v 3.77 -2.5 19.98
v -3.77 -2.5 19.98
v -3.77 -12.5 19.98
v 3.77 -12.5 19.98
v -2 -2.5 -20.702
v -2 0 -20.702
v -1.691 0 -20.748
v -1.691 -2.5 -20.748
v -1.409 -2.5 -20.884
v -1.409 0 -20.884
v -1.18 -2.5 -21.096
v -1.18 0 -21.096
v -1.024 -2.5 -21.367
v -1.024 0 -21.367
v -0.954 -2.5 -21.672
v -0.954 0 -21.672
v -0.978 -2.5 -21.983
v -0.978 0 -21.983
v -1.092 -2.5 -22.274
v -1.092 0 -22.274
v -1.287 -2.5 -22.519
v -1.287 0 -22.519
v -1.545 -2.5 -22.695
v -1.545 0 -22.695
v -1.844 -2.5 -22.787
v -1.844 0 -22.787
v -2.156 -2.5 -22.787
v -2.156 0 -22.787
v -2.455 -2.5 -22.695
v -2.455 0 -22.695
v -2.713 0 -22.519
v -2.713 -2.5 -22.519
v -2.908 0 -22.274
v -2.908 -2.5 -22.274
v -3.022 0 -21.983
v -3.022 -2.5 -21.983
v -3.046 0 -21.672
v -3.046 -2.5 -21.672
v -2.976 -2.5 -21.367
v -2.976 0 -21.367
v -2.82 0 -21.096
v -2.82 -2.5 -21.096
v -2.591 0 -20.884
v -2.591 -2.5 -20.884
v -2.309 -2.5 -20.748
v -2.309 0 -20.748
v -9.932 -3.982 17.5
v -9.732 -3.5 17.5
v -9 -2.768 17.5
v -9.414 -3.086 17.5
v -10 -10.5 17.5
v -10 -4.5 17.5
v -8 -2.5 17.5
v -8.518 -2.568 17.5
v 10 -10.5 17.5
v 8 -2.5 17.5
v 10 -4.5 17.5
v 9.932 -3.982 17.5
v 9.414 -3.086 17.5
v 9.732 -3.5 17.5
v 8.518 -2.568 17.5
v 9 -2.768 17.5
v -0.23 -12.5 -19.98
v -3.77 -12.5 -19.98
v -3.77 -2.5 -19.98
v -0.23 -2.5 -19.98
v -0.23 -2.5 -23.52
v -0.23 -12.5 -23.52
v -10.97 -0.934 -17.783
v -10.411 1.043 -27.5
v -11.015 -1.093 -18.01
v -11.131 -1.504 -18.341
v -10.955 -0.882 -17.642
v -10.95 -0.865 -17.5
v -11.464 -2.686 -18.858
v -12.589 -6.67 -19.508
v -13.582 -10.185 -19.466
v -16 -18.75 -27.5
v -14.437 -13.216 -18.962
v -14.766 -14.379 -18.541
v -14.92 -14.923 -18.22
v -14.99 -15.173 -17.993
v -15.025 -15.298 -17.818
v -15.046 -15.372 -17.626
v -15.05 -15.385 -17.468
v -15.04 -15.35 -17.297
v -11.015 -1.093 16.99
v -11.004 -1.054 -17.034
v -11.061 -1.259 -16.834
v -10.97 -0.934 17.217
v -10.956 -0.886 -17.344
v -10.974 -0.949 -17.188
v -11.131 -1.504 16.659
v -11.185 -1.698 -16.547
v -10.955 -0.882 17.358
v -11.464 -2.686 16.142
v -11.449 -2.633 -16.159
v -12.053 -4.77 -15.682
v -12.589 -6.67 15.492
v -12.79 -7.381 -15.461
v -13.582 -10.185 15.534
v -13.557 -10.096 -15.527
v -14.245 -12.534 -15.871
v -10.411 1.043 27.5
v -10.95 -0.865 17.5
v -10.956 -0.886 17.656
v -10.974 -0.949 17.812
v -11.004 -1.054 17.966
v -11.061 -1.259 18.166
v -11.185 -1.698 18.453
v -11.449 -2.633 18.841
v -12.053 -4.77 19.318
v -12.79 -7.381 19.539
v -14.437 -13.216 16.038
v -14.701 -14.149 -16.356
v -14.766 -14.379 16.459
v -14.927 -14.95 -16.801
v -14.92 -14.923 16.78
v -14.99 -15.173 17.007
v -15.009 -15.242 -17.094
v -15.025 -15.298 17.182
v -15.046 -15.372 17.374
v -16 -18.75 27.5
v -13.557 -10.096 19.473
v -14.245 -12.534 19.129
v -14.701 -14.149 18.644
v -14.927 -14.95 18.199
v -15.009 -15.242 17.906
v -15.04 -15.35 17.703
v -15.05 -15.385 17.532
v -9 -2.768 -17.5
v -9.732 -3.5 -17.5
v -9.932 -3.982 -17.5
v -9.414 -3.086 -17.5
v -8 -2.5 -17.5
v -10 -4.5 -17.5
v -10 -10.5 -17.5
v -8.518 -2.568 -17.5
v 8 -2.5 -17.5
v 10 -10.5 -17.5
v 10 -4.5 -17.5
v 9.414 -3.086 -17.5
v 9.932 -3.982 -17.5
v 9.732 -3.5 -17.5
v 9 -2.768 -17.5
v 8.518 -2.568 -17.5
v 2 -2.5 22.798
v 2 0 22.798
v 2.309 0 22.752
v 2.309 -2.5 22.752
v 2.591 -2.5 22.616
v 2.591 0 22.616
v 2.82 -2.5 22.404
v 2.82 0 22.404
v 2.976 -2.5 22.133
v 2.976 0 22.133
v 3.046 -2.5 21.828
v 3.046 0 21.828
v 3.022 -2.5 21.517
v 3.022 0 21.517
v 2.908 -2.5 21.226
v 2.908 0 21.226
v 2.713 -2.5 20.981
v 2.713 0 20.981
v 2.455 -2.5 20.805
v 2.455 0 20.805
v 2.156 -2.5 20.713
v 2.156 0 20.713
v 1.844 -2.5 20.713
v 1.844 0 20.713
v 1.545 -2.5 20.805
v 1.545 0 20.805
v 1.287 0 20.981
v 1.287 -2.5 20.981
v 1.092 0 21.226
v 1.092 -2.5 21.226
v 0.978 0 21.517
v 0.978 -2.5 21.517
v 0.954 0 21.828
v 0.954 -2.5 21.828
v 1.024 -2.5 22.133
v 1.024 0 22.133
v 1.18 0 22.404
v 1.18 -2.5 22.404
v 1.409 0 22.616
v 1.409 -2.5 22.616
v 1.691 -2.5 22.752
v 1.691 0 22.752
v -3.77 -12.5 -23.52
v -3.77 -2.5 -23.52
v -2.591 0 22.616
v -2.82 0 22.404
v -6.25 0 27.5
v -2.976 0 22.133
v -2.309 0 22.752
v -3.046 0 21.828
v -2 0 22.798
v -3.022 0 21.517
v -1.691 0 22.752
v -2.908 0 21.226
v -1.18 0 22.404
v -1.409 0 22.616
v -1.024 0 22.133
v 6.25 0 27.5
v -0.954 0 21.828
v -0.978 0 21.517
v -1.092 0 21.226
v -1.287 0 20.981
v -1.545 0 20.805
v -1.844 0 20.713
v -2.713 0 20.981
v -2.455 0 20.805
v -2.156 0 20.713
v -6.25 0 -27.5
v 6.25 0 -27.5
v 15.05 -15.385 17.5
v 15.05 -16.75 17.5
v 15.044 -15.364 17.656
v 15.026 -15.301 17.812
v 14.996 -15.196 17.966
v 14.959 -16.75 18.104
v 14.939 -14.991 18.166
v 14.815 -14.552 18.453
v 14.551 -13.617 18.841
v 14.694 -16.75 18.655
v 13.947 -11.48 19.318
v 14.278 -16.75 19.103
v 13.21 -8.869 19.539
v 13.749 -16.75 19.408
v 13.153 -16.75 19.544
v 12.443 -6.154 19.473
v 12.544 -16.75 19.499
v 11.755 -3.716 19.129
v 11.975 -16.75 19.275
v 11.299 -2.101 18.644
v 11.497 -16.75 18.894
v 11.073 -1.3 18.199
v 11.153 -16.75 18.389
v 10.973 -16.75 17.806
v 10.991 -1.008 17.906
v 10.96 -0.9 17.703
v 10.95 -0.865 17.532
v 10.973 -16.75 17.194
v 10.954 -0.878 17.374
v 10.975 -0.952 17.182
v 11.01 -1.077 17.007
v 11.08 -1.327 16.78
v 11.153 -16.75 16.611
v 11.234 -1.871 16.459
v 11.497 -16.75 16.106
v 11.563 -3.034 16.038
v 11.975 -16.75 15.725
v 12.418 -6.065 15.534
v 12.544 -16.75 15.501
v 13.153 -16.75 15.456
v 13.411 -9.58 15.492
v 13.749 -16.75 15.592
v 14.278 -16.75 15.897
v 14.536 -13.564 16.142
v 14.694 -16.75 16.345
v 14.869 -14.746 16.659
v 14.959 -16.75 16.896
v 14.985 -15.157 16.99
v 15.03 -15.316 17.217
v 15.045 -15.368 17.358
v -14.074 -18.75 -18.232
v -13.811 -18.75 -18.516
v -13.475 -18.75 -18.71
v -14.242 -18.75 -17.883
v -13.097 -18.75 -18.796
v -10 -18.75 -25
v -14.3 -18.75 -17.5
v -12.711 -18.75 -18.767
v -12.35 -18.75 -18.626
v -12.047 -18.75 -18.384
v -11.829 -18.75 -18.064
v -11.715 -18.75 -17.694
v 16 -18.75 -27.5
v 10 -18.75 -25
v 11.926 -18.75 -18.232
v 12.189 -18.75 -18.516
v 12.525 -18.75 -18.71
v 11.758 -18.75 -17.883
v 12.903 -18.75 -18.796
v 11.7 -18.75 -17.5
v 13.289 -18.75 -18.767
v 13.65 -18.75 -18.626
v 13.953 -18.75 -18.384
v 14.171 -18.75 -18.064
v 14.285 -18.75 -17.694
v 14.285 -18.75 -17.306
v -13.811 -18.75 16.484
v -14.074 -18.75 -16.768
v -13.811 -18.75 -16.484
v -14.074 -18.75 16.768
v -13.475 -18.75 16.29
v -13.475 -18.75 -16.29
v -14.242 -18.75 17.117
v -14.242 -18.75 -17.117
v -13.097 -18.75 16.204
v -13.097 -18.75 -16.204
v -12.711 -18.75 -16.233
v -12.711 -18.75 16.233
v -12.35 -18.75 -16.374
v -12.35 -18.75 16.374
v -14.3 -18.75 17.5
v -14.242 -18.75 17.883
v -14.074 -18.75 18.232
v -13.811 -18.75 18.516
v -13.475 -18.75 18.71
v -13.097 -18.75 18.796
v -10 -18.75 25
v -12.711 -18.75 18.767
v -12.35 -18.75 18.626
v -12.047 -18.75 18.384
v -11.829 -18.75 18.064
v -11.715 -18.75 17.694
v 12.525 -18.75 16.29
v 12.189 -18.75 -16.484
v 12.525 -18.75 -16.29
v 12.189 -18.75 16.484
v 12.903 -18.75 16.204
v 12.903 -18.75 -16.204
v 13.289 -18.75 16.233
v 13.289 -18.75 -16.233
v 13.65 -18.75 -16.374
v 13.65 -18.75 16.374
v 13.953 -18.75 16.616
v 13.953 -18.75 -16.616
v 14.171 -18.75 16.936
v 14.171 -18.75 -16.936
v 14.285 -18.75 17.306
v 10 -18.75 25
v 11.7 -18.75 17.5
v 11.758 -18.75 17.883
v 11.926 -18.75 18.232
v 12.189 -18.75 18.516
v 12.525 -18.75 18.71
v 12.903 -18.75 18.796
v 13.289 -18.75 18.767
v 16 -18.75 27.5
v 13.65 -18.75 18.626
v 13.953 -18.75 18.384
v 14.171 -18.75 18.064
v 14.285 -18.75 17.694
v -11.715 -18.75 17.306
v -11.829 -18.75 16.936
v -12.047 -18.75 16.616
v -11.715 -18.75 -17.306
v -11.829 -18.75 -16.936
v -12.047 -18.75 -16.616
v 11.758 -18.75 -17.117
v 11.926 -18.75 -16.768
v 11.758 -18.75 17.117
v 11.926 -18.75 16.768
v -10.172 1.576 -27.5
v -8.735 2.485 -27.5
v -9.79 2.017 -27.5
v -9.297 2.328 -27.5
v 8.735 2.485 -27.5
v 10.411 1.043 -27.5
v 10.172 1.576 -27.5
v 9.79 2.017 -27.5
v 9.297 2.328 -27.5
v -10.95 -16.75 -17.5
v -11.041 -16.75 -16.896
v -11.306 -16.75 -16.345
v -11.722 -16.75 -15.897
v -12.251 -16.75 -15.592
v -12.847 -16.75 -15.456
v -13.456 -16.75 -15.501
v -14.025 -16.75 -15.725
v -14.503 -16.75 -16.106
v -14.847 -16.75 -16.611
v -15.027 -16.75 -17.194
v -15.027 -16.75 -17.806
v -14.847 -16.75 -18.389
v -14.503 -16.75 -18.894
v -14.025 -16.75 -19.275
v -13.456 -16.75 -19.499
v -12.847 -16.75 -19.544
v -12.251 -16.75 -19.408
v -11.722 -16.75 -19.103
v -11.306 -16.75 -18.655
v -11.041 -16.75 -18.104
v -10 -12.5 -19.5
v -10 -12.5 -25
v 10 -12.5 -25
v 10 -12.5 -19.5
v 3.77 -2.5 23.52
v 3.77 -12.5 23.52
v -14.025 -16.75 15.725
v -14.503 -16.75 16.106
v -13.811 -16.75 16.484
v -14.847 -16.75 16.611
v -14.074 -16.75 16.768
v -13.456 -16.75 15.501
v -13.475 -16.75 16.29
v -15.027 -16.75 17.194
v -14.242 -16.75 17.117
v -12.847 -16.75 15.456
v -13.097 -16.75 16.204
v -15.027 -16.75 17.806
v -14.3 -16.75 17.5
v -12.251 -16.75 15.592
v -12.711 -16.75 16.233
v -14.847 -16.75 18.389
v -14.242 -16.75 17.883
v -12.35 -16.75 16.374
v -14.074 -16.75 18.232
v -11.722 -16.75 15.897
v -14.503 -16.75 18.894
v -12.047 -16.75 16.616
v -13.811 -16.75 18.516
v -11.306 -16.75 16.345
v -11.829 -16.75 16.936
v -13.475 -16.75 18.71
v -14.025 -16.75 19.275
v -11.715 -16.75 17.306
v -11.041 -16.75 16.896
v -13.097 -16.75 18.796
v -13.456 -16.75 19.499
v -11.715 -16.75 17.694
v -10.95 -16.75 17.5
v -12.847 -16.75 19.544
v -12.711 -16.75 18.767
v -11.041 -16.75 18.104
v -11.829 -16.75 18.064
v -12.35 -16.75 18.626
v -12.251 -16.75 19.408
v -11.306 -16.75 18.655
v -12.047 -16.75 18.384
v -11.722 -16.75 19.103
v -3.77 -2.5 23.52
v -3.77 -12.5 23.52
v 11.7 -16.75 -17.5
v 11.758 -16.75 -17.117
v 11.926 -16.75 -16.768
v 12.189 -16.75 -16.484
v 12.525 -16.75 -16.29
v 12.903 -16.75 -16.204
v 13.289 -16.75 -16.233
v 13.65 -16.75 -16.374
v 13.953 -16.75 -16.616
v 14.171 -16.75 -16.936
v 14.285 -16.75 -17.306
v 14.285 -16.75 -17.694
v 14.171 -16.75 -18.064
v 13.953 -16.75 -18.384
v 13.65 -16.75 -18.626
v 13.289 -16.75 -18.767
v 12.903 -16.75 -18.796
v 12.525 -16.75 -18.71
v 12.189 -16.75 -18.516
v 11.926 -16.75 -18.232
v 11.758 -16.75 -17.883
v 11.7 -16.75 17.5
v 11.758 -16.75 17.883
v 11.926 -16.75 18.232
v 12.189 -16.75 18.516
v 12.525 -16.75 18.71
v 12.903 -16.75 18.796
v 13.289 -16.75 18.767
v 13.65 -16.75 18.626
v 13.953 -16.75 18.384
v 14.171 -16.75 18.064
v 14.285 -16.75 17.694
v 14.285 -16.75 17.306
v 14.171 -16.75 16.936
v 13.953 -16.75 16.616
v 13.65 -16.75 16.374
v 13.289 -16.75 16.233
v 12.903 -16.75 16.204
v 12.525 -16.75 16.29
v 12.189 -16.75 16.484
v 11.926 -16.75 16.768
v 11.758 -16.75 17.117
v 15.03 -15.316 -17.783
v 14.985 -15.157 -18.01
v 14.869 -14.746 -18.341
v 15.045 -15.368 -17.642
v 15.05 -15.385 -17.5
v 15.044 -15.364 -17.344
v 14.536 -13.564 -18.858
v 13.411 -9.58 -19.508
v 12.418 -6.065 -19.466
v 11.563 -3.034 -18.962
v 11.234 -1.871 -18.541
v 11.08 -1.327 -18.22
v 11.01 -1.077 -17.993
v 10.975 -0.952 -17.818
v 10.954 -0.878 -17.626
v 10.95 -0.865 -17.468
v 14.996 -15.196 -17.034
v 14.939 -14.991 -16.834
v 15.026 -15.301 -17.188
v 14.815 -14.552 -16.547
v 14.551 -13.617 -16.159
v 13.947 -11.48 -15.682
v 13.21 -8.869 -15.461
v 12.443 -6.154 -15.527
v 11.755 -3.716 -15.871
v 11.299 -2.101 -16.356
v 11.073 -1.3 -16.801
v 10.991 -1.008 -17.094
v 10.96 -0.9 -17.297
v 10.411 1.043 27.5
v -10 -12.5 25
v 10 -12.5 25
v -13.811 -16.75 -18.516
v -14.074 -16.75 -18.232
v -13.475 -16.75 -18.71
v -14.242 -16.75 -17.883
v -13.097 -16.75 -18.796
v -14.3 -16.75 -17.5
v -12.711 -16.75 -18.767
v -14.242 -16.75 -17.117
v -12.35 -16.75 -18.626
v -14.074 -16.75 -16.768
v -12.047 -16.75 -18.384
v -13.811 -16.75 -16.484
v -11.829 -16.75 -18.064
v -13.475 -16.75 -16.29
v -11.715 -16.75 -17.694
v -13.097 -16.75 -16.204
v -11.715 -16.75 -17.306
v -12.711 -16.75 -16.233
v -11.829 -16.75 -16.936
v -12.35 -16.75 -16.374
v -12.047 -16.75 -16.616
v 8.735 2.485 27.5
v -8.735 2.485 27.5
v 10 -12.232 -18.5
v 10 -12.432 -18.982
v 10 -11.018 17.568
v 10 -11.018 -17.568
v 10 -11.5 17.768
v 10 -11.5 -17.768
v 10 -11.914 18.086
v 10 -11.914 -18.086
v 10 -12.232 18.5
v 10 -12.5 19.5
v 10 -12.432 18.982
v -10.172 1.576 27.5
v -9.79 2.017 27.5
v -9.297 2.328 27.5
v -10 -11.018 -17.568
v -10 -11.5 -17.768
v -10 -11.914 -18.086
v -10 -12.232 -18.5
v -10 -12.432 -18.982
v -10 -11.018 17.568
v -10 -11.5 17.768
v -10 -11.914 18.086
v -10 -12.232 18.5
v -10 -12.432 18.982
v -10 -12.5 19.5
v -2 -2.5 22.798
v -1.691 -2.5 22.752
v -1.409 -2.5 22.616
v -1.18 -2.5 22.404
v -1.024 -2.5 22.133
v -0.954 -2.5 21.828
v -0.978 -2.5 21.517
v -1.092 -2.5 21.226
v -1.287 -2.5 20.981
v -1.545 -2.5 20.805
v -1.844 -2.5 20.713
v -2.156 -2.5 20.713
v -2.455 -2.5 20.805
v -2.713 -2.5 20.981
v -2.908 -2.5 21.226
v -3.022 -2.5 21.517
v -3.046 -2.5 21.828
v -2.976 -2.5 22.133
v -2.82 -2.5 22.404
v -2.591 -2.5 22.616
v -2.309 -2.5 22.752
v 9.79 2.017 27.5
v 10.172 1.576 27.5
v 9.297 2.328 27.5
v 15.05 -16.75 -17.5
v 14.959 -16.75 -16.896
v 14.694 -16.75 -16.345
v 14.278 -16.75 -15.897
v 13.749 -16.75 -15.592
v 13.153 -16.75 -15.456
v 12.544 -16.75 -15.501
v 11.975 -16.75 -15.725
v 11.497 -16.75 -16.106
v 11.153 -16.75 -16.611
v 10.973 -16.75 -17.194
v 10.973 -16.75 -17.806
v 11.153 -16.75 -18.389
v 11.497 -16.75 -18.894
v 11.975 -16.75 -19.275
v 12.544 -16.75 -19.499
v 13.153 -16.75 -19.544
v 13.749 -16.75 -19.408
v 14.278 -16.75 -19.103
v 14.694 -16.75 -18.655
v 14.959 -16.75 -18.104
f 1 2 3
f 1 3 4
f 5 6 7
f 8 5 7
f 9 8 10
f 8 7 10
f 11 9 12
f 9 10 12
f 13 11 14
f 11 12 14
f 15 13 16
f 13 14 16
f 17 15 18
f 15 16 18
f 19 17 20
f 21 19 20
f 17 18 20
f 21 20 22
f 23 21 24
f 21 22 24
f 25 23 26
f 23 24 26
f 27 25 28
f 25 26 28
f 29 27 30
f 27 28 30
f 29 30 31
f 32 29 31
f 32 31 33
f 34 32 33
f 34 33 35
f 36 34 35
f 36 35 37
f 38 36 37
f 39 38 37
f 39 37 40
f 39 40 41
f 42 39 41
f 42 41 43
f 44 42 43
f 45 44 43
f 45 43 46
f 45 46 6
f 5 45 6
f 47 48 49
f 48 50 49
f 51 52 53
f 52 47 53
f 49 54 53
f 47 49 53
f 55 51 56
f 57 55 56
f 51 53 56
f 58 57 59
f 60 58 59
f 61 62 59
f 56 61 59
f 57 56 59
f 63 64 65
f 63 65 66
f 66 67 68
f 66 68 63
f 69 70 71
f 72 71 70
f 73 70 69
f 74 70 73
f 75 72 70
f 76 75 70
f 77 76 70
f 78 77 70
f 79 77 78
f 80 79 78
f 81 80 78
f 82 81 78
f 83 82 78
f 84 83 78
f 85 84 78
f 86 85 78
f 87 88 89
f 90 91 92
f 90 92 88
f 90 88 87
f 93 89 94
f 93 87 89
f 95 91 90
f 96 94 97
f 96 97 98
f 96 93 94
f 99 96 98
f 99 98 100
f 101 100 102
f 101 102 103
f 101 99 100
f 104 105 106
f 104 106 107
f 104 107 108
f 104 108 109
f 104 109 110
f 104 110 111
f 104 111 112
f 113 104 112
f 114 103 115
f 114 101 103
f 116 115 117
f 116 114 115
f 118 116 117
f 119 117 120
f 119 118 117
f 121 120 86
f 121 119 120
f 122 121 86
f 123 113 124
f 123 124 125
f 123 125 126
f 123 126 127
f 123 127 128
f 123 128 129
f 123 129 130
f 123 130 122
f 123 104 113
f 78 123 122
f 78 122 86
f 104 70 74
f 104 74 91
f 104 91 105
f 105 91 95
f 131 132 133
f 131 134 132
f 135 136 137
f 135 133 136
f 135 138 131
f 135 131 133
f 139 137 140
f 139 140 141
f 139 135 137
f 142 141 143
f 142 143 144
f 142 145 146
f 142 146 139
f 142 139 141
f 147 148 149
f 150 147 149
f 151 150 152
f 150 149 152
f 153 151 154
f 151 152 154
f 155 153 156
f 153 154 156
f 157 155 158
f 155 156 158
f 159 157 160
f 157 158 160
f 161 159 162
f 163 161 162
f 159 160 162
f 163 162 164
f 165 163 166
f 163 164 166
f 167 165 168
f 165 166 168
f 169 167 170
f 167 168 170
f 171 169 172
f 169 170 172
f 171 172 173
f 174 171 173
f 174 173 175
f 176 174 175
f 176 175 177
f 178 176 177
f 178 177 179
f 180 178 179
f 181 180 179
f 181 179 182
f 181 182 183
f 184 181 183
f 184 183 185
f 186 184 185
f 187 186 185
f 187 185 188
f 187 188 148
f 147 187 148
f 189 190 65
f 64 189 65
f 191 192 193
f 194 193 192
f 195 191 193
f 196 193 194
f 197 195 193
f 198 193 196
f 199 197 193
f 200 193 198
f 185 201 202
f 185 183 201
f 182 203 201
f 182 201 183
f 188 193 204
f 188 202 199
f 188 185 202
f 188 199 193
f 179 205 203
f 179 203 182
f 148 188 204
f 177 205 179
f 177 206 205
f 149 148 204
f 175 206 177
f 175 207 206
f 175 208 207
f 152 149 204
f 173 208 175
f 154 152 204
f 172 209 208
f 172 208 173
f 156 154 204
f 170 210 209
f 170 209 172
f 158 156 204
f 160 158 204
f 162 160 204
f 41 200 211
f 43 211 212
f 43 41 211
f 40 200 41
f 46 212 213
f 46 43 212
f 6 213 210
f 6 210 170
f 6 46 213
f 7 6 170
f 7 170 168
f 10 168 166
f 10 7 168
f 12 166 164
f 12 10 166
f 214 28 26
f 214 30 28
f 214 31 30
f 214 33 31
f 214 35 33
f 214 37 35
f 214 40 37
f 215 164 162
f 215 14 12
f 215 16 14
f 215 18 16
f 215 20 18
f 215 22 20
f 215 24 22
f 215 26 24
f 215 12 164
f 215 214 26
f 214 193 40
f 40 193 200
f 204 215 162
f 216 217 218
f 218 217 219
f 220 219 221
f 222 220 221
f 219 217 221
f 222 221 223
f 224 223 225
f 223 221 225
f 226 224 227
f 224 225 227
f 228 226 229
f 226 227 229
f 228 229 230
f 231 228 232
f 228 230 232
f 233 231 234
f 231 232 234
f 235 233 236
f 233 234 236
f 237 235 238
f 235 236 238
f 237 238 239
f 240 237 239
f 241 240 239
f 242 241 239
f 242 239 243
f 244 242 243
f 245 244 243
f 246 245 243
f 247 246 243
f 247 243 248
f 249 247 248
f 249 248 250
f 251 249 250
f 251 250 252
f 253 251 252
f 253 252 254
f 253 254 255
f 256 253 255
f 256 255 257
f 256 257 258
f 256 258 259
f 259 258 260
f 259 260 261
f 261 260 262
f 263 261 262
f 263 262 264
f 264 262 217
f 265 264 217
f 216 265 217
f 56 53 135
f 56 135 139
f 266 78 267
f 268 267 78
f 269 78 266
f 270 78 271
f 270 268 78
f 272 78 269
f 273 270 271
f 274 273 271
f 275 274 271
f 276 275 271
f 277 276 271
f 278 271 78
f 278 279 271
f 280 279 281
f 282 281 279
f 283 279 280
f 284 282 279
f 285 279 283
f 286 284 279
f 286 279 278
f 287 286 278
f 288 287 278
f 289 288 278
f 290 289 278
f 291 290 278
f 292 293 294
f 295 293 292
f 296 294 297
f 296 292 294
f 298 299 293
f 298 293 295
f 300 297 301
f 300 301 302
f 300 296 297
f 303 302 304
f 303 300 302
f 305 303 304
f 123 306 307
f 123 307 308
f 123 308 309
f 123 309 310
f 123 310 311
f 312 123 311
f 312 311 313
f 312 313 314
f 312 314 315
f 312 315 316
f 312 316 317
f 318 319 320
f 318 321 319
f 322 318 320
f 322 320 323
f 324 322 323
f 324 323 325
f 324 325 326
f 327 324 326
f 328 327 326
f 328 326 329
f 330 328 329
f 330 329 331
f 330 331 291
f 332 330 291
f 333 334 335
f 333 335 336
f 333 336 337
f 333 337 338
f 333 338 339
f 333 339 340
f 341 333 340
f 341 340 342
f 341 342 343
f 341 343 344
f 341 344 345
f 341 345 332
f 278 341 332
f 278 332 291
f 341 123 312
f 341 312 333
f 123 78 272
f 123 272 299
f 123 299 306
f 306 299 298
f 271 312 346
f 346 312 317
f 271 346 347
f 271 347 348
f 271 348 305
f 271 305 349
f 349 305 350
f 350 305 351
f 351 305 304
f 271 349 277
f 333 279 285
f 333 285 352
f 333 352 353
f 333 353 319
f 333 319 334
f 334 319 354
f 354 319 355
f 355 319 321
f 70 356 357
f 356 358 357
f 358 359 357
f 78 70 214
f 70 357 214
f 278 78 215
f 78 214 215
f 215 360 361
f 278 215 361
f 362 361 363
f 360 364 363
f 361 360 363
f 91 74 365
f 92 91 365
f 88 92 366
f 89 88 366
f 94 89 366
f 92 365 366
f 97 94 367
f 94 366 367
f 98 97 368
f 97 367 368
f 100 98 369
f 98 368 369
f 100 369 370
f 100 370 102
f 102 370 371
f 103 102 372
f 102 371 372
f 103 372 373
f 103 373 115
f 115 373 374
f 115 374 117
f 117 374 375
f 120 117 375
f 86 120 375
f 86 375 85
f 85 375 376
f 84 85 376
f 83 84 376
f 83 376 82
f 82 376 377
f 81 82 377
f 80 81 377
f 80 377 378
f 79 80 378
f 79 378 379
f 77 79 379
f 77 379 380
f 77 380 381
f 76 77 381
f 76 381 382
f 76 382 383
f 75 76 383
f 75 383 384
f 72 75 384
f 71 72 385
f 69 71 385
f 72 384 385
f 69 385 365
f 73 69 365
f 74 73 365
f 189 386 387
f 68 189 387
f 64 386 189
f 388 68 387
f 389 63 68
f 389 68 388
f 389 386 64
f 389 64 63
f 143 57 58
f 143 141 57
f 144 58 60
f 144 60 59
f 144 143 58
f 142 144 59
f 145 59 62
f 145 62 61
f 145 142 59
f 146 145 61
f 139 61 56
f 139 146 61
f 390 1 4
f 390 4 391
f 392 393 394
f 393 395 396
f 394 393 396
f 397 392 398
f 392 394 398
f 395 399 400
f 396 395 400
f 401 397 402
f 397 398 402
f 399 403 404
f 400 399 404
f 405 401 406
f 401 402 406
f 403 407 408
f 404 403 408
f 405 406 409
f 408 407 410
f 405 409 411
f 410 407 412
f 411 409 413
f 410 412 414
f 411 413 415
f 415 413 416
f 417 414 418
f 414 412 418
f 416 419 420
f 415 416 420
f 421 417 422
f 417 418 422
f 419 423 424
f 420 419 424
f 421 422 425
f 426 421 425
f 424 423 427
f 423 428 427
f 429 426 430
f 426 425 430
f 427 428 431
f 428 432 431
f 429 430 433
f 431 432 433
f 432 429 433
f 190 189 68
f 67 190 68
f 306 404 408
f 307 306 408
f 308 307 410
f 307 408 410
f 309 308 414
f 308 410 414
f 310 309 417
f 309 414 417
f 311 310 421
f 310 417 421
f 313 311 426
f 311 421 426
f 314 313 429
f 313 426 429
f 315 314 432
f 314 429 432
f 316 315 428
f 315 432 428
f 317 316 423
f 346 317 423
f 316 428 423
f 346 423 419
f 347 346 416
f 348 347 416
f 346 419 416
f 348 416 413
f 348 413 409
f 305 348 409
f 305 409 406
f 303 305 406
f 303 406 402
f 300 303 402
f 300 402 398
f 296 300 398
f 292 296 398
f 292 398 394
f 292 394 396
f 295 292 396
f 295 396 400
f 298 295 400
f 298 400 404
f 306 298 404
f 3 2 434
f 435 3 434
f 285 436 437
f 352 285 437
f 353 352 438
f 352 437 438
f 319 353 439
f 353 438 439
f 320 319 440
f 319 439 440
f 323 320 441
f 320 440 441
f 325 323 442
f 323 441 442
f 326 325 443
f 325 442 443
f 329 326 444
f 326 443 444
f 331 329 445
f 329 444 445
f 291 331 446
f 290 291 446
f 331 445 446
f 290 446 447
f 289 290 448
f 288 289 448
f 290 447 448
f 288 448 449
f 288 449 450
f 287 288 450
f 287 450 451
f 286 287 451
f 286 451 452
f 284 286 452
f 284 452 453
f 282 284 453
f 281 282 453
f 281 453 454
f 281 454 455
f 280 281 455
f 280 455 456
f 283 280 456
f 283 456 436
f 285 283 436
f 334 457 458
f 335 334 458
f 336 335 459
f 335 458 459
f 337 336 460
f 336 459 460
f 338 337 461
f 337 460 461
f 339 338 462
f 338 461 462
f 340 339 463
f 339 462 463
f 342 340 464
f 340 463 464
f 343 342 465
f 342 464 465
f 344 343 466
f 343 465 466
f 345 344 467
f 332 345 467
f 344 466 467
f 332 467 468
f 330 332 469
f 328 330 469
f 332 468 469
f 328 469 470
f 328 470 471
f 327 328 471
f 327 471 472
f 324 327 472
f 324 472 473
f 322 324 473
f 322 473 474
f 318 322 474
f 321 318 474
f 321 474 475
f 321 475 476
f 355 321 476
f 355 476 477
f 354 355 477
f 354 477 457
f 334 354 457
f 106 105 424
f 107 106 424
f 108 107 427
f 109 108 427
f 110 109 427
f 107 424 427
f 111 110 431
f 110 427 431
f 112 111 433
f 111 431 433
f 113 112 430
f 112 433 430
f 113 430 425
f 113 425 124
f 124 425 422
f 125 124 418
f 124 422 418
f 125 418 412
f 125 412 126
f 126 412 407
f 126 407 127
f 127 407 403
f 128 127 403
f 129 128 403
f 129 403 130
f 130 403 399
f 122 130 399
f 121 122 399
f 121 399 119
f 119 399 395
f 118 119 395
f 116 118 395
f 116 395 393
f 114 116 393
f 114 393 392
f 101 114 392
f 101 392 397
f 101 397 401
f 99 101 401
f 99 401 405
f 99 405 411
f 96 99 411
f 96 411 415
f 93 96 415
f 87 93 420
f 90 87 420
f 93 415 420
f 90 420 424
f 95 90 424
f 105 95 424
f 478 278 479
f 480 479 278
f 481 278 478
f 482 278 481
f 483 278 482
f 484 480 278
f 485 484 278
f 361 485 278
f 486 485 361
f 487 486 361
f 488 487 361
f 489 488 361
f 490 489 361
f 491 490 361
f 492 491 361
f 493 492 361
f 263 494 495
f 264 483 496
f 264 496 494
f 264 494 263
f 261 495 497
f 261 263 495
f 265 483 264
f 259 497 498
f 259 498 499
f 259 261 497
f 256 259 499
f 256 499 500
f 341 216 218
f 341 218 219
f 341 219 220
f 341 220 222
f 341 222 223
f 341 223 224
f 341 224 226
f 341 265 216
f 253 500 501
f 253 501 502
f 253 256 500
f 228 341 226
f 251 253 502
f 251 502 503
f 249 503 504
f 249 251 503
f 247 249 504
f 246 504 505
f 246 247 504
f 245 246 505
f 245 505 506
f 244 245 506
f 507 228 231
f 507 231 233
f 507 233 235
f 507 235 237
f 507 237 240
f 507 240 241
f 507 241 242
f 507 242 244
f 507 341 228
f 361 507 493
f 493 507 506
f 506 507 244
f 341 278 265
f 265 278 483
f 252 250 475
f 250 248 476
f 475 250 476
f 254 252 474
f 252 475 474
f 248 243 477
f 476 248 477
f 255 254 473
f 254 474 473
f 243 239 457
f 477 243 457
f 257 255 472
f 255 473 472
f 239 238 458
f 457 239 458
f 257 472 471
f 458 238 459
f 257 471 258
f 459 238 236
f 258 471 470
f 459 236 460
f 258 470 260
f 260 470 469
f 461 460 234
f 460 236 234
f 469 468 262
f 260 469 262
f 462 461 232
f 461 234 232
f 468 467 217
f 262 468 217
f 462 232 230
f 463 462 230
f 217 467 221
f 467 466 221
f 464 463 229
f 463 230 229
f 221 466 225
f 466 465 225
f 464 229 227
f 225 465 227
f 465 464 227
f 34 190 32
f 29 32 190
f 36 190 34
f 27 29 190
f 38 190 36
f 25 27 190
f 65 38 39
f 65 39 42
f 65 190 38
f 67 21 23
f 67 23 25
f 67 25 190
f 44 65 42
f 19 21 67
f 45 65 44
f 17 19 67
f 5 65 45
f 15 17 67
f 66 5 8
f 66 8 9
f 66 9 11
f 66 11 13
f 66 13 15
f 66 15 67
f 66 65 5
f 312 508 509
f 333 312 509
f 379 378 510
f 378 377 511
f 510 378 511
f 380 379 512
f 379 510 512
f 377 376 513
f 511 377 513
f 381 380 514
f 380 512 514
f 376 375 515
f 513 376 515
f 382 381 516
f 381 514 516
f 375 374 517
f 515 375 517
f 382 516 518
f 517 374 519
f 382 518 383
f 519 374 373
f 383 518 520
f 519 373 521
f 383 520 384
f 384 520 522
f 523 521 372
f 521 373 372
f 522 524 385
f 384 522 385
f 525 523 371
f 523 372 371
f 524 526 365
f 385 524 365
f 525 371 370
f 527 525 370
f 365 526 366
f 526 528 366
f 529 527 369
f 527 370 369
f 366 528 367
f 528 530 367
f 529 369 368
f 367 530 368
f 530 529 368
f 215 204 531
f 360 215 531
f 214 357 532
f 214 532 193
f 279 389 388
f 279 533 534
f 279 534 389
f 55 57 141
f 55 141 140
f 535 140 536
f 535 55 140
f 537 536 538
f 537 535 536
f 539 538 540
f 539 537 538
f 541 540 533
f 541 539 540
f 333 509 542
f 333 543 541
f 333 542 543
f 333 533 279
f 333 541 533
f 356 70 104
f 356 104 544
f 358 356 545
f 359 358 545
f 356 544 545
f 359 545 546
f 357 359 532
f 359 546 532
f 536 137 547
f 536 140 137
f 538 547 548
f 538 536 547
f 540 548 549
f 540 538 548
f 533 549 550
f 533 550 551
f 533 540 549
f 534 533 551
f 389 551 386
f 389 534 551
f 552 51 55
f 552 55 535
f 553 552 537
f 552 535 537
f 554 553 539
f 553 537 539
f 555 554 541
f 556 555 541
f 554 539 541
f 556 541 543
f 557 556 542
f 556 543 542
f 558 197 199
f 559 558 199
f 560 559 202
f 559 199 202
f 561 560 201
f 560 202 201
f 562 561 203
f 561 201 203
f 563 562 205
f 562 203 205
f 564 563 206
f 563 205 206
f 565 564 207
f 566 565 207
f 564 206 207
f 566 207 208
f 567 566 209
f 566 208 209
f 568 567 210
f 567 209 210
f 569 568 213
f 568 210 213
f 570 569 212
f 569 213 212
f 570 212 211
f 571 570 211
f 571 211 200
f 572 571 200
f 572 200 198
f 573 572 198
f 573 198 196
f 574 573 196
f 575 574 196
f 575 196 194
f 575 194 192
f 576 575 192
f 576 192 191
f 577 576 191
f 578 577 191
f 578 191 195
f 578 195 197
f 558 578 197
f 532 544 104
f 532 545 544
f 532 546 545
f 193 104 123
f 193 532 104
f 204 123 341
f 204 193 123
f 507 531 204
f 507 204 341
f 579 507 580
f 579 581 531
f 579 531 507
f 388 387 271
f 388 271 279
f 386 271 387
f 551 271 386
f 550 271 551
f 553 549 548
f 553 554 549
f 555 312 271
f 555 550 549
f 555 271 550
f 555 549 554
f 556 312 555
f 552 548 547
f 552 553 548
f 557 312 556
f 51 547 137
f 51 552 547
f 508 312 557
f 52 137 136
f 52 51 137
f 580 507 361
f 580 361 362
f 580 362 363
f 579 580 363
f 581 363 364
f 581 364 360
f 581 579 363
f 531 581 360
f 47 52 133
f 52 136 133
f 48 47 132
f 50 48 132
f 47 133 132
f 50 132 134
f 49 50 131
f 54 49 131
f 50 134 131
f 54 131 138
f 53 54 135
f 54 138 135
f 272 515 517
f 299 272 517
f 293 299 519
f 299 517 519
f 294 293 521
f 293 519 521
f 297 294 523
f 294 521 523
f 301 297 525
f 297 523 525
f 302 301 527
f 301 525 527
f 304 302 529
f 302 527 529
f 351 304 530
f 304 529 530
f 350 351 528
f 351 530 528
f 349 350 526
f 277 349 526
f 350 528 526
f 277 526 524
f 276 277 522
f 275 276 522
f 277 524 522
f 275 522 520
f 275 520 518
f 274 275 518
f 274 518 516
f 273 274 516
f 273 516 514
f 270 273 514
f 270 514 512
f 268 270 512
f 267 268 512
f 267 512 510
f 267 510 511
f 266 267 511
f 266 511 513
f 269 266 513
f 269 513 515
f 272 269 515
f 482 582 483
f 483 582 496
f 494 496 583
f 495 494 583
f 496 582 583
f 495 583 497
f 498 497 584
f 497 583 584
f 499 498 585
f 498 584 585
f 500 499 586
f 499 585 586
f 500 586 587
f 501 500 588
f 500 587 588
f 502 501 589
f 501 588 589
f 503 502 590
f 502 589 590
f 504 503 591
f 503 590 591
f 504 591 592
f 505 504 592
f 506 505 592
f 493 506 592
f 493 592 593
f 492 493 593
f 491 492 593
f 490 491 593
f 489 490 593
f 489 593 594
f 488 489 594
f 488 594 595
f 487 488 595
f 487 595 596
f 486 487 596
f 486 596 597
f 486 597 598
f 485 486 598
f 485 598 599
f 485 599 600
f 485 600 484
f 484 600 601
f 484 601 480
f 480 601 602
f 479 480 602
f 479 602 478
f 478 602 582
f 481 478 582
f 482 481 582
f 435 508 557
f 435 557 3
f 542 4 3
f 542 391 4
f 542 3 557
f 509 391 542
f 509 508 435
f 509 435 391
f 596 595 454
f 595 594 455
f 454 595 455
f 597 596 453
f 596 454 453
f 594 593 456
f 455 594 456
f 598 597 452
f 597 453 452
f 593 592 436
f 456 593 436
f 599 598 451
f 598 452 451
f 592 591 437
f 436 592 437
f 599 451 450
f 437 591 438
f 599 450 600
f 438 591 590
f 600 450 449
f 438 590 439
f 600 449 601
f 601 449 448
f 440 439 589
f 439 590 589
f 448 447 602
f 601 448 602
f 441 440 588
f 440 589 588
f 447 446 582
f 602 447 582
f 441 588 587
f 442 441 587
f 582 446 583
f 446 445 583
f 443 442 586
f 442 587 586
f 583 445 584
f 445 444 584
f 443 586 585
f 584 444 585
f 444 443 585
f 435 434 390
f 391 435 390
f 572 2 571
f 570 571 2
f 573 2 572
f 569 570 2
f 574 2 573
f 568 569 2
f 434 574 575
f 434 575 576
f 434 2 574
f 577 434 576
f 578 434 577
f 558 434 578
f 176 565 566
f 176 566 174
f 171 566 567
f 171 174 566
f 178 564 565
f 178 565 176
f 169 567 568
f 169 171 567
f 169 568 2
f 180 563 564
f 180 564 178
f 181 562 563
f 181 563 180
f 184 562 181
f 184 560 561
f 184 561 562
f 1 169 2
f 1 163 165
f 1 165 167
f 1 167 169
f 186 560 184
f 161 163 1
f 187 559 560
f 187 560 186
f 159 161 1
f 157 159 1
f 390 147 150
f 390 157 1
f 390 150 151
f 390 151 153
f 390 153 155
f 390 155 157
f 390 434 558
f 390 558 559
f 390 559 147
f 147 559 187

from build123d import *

# Parameters (mm, degrees)
BOSS_EXTRUDE1_DEPTH  = 25
BOSS_EXTRUDE2_DEPTH  = 2.5
SKETCH5_W            = 20
SKETCH5_H            = 7.5
SKETCH5_W_2          = 7.54
SKETCH5_H_2          = 3.54
SKETCH5_W_3          = 3.54
BOSS_EXTRUDE3_DEPTH  = 10
SKETCH6_R            = 1.0485
CUT_EXTRUDE1_DEPTH   = 39.259802665
FILLET1_R            = 2
M2_CLEARANCE_HOLE1_D = 2.6
SKETCH9_R            = 2.05
CUT_EXTRUDE4_DEPTH   = 38.186186952
SKETCH10_W           = 12.5
SKETCH10_H           = 55
CUT_EXTRUDE5_DEPTH   = 2.5
CHAMFER1_SIZE        = 2.5


with BuildPart() as part:
    # Sketch2 → Boss-Extrude1 (new, symmetric)
    with BuildSketch(Plane.XY):
        Polygon((10, -2.5), (10, -18.75), (16, -18.75), (10, 2.5), (-10, 2.5), (-16, -18.75), (-10, -18.75), (-10, -2.5), align=None)
    extrude(amount=BOSS_EXTRUDE1_DEPTH, both=True)

    # Sketch3 → Boss-Extrude2 (add)
    with BuildSketch(Plane.XY.offset(25)):
        Polygon((-10, -18.75), (10, -18.75), (16, -18.75), (10, 2.5), (-10, 2.5), (-16, -18.75), align=None)
    boss_extrude2 = extrude(amount=BOSS_EXTRUDE2_DEPTH)

    # Mirror1: Boss-Extrude2 across plane
    add(boss_extrude2.mirror(Plane.XY))

    # Sketch5 → Boss-Extrude3 (add)
    # profile 1 of 2: a face of its own
    with BuildSketch(Plane.XZ.offset(2.5)):
        with Locations((0, 21.25)):
            Rectangle(SKETCH5_W, SKETCH5_H)
        with Locations((0, 21.75)):
            Rectangle(SKETCH5_W_2, SKETCH5_H_2, mode=Mode.SUBTRACT)
    # profile 2 of 2: a face of its own
    with BuildSketch(Plane.XZ.offset(2.5)):
        with Locations((0, -21.25)):
            Rectangle(SKETCH5_W, SKETCH5_H)
        with Locations((-2, -21.75)):
            Rectangle(SKETCH5_W_3, SKETCH5_H_2, mode=Mode.SUBTRACT)
    extrude(amount=BOSS_EXTRUDE3_DEPTH)

    # Sketch6 → Cut-Extrude1 (cut, through all)
    with BuildSketch(Plane(origin=(0, 2.5, 0), x_dir=(1, 0, 0), z_dir=(0, 1, 0))):
        with Locations(Location((-2, 21.75, 0), (0, 0, 270))):
            Circle(SKETCH6_R)
        with Locations(Location((-2, -21.75, 0), (0, 0, 270))):
            Circle(SKETCH6_R)
        with Locations(Location((2, -21.75, 0), (0, 0, 270))):
            Circle(SKETCH6_R)
    extrude(amount=-CUT_EXTRUDE1_DEPTH, mode=Mode.SUBTRACT)

    # Fillet1
    fillet1_edges = [part.edges().sort_by_distance(p)[0] for p in [
        (-10, 2.5, 0),
        (10, 2.5, 0),
        (10, -2.5, 0),
        (-10, -2.5, 0),
        (0, -12.5, 17.5),
        (0, -12.5, -17.5),
    ]]
    fillet(fillet1_edges, radius=FILLET1_R)

    # M2 Clearance Hole1 (through all)
    with Locations(Plane.XZ.offset(18.75)):
        with Locations((-13, 17.5), (13, 17.5), (13, -17.5), (-13, -17.5)):
            Hole(M2_CLEARANCE_HOLE1_D / 2)

    # Sketch9 → Cut-Extrude4 (cut, through all)
    with BuildSketch(Plane.XZ.offset(16.75)):
        with Locations((-13, -17.5)):
            Circle(SKETCH9_R)
        with Locations((13, -17.5)):
            Circle(SKETCH9_R)
        with Locations((13, 17.5)):
            Circle(SKETCH9_R)
        with Locations((-13, 17.5)):
            Circle(SKETCH9_R)
    extrude(amount=-CUT_EXTRUDE4_DEPTH, mode=Mode.SUBTRACT)

    # Sketch10 → Cut-Extrude5 (cut)
    with BuildSketch(Plane(origin=(0, 2.5, 0), x_dir=(1, 0, 0), z_dir=(0, 1, 0))):
        Rectangle(SKETCH10_W, SKETCH10_H)
    extrude(amount=-CUT_EXTRUDE5_DEPTH, mode=Mode.SUBTRACT)

    # Chamfer1
    # the kernel refuses this chamfer: 2.5 mm, written as the material it takes off along each edge
    with BuildSketch(Plane(origin=(6.25, 2.5, 33.92920747), x_dir=(-0.027495876610586317, -0.9996219169112968, 0), z_dir=(0, 0, -1))) as chamfer1_piece_1_section:
        Polygon((CHAMFER1_SIZE * 0.999621916911, -CHAMFER1_SIZE * 0.0274958766106), (-CHAMFER1_SIZE * 0.0274958766106, -CHAMFER1_SIZE * 0.999621916911), (0, 0), align=None)
    chamfer1_piece_1 = extrude(amount=67.85841494, mode=Mode.PRIVATE)
    chamfer1_piece_1 = split(chamfer1_piece_1, bisect_by=Plane(origin=(7.076010386, 0, 0), z_dir=(0, 1, 0)), keep=Keep.TOP, mode=Mode.PRIVATE)
    add(chamfer1_piece_1, mode=Mode.SUBTRACT)
    with BuildSketch(Plane(origin=(-6.25, 2.5, -33.92920747), x_dir=(-0.9996219169112968, 0.02749587661058649, 0), z_dir=(0, 0, 1))) as chamfer1_piece_2_section:
        Polygon((CHAMFER1_SIZE * 0.999621916911, CHAMFER1_SIZE * 0.0274958766106), (-CHAMFER1_SIZE * 0.0274958766106, CHAMFER1_SIZE * 0.999621916911), (0, 0), align=None)
    chamfer1_piece_2 = extrude(amount=67.85841494, mode=Mode.PRIVATE)
    chamfer1_piece_2 = split(chamfer1_piece_2, bisect_by=Plane(origin=(-7.076010386, 0, 0), z_dir=(0, 1, 0)), keep=Keep.TOP, mode=Mode.PRIVATE)
    add(chamfer1_piece_2, mode=Mode.SUBTRACT)


solid = part.part
